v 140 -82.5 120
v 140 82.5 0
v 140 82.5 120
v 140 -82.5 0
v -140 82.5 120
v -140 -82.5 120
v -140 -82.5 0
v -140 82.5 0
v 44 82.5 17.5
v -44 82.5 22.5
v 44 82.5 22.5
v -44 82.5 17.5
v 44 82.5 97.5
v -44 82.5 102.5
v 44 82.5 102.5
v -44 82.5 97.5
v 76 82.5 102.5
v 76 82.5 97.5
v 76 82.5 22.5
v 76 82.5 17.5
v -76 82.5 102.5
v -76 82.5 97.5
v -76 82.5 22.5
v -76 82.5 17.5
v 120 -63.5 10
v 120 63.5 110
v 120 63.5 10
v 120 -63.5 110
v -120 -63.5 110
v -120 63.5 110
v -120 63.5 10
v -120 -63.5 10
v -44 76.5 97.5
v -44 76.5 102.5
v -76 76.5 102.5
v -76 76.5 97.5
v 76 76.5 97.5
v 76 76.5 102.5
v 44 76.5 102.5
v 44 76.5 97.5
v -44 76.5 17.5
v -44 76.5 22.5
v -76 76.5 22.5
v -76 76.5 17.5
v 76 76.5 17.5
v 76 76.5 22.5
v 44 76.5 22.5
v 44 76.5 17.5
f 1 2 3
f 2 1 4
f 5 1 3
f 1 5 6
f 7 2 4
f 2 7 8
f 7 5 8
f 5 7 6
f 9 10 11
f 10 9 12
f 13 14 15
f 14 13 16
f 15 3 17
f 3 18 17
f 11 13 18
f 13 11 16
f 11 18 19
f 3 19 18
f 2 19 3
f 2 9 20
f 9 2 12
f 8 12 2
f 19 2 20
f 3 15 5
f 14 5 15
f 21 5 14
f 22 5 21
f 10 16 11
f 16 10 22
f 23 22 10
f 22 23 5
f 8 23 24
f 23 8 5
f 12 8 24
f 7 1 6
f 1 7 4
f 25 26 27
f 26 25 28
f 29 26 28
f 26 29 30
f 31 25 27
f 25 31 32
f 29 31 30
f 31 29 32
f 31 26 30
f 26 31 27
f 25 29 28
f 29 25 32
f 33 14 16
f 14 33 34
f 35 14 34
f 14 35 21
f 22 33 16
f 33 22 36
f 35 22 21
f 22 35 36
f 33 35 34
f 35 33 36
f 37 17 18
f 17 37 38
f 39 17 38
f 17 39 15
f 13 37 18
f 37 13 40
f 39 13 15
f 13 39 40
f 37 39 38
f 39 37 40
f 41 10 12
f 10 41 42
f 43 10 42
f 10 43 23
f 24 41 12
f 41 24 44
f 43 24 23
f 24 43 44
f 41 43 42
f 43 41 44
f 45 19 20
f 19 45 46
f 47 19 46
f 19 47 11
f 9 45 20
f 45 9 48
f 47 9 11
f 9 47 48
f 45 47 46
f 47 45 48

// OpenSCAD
outer_w=280; outer_d=165; outer_h=120;
inner_w=240; inner_d=127; inner_h=100; bottom_wall=10;
module shell(){ translate([-outer_w/2,-outer_d/2,0]) cube([outer_w,outer_d,outer_h]); }
module hollow(){ translate([-inner_w/2,-inner_d/2,bottom_wall]) cube([inner_w,inner_d,inner_h]); }
module strap(x,z){ translate([x, outer_d/2-3, z]) rotate([0,0,0]) cube([32,6,5],center=true); }
difference(){ shell(); hollow(); strap(-60, outer_h-20); strap(60, outer_h-20); strap(-60,20); strap(60,20); }
